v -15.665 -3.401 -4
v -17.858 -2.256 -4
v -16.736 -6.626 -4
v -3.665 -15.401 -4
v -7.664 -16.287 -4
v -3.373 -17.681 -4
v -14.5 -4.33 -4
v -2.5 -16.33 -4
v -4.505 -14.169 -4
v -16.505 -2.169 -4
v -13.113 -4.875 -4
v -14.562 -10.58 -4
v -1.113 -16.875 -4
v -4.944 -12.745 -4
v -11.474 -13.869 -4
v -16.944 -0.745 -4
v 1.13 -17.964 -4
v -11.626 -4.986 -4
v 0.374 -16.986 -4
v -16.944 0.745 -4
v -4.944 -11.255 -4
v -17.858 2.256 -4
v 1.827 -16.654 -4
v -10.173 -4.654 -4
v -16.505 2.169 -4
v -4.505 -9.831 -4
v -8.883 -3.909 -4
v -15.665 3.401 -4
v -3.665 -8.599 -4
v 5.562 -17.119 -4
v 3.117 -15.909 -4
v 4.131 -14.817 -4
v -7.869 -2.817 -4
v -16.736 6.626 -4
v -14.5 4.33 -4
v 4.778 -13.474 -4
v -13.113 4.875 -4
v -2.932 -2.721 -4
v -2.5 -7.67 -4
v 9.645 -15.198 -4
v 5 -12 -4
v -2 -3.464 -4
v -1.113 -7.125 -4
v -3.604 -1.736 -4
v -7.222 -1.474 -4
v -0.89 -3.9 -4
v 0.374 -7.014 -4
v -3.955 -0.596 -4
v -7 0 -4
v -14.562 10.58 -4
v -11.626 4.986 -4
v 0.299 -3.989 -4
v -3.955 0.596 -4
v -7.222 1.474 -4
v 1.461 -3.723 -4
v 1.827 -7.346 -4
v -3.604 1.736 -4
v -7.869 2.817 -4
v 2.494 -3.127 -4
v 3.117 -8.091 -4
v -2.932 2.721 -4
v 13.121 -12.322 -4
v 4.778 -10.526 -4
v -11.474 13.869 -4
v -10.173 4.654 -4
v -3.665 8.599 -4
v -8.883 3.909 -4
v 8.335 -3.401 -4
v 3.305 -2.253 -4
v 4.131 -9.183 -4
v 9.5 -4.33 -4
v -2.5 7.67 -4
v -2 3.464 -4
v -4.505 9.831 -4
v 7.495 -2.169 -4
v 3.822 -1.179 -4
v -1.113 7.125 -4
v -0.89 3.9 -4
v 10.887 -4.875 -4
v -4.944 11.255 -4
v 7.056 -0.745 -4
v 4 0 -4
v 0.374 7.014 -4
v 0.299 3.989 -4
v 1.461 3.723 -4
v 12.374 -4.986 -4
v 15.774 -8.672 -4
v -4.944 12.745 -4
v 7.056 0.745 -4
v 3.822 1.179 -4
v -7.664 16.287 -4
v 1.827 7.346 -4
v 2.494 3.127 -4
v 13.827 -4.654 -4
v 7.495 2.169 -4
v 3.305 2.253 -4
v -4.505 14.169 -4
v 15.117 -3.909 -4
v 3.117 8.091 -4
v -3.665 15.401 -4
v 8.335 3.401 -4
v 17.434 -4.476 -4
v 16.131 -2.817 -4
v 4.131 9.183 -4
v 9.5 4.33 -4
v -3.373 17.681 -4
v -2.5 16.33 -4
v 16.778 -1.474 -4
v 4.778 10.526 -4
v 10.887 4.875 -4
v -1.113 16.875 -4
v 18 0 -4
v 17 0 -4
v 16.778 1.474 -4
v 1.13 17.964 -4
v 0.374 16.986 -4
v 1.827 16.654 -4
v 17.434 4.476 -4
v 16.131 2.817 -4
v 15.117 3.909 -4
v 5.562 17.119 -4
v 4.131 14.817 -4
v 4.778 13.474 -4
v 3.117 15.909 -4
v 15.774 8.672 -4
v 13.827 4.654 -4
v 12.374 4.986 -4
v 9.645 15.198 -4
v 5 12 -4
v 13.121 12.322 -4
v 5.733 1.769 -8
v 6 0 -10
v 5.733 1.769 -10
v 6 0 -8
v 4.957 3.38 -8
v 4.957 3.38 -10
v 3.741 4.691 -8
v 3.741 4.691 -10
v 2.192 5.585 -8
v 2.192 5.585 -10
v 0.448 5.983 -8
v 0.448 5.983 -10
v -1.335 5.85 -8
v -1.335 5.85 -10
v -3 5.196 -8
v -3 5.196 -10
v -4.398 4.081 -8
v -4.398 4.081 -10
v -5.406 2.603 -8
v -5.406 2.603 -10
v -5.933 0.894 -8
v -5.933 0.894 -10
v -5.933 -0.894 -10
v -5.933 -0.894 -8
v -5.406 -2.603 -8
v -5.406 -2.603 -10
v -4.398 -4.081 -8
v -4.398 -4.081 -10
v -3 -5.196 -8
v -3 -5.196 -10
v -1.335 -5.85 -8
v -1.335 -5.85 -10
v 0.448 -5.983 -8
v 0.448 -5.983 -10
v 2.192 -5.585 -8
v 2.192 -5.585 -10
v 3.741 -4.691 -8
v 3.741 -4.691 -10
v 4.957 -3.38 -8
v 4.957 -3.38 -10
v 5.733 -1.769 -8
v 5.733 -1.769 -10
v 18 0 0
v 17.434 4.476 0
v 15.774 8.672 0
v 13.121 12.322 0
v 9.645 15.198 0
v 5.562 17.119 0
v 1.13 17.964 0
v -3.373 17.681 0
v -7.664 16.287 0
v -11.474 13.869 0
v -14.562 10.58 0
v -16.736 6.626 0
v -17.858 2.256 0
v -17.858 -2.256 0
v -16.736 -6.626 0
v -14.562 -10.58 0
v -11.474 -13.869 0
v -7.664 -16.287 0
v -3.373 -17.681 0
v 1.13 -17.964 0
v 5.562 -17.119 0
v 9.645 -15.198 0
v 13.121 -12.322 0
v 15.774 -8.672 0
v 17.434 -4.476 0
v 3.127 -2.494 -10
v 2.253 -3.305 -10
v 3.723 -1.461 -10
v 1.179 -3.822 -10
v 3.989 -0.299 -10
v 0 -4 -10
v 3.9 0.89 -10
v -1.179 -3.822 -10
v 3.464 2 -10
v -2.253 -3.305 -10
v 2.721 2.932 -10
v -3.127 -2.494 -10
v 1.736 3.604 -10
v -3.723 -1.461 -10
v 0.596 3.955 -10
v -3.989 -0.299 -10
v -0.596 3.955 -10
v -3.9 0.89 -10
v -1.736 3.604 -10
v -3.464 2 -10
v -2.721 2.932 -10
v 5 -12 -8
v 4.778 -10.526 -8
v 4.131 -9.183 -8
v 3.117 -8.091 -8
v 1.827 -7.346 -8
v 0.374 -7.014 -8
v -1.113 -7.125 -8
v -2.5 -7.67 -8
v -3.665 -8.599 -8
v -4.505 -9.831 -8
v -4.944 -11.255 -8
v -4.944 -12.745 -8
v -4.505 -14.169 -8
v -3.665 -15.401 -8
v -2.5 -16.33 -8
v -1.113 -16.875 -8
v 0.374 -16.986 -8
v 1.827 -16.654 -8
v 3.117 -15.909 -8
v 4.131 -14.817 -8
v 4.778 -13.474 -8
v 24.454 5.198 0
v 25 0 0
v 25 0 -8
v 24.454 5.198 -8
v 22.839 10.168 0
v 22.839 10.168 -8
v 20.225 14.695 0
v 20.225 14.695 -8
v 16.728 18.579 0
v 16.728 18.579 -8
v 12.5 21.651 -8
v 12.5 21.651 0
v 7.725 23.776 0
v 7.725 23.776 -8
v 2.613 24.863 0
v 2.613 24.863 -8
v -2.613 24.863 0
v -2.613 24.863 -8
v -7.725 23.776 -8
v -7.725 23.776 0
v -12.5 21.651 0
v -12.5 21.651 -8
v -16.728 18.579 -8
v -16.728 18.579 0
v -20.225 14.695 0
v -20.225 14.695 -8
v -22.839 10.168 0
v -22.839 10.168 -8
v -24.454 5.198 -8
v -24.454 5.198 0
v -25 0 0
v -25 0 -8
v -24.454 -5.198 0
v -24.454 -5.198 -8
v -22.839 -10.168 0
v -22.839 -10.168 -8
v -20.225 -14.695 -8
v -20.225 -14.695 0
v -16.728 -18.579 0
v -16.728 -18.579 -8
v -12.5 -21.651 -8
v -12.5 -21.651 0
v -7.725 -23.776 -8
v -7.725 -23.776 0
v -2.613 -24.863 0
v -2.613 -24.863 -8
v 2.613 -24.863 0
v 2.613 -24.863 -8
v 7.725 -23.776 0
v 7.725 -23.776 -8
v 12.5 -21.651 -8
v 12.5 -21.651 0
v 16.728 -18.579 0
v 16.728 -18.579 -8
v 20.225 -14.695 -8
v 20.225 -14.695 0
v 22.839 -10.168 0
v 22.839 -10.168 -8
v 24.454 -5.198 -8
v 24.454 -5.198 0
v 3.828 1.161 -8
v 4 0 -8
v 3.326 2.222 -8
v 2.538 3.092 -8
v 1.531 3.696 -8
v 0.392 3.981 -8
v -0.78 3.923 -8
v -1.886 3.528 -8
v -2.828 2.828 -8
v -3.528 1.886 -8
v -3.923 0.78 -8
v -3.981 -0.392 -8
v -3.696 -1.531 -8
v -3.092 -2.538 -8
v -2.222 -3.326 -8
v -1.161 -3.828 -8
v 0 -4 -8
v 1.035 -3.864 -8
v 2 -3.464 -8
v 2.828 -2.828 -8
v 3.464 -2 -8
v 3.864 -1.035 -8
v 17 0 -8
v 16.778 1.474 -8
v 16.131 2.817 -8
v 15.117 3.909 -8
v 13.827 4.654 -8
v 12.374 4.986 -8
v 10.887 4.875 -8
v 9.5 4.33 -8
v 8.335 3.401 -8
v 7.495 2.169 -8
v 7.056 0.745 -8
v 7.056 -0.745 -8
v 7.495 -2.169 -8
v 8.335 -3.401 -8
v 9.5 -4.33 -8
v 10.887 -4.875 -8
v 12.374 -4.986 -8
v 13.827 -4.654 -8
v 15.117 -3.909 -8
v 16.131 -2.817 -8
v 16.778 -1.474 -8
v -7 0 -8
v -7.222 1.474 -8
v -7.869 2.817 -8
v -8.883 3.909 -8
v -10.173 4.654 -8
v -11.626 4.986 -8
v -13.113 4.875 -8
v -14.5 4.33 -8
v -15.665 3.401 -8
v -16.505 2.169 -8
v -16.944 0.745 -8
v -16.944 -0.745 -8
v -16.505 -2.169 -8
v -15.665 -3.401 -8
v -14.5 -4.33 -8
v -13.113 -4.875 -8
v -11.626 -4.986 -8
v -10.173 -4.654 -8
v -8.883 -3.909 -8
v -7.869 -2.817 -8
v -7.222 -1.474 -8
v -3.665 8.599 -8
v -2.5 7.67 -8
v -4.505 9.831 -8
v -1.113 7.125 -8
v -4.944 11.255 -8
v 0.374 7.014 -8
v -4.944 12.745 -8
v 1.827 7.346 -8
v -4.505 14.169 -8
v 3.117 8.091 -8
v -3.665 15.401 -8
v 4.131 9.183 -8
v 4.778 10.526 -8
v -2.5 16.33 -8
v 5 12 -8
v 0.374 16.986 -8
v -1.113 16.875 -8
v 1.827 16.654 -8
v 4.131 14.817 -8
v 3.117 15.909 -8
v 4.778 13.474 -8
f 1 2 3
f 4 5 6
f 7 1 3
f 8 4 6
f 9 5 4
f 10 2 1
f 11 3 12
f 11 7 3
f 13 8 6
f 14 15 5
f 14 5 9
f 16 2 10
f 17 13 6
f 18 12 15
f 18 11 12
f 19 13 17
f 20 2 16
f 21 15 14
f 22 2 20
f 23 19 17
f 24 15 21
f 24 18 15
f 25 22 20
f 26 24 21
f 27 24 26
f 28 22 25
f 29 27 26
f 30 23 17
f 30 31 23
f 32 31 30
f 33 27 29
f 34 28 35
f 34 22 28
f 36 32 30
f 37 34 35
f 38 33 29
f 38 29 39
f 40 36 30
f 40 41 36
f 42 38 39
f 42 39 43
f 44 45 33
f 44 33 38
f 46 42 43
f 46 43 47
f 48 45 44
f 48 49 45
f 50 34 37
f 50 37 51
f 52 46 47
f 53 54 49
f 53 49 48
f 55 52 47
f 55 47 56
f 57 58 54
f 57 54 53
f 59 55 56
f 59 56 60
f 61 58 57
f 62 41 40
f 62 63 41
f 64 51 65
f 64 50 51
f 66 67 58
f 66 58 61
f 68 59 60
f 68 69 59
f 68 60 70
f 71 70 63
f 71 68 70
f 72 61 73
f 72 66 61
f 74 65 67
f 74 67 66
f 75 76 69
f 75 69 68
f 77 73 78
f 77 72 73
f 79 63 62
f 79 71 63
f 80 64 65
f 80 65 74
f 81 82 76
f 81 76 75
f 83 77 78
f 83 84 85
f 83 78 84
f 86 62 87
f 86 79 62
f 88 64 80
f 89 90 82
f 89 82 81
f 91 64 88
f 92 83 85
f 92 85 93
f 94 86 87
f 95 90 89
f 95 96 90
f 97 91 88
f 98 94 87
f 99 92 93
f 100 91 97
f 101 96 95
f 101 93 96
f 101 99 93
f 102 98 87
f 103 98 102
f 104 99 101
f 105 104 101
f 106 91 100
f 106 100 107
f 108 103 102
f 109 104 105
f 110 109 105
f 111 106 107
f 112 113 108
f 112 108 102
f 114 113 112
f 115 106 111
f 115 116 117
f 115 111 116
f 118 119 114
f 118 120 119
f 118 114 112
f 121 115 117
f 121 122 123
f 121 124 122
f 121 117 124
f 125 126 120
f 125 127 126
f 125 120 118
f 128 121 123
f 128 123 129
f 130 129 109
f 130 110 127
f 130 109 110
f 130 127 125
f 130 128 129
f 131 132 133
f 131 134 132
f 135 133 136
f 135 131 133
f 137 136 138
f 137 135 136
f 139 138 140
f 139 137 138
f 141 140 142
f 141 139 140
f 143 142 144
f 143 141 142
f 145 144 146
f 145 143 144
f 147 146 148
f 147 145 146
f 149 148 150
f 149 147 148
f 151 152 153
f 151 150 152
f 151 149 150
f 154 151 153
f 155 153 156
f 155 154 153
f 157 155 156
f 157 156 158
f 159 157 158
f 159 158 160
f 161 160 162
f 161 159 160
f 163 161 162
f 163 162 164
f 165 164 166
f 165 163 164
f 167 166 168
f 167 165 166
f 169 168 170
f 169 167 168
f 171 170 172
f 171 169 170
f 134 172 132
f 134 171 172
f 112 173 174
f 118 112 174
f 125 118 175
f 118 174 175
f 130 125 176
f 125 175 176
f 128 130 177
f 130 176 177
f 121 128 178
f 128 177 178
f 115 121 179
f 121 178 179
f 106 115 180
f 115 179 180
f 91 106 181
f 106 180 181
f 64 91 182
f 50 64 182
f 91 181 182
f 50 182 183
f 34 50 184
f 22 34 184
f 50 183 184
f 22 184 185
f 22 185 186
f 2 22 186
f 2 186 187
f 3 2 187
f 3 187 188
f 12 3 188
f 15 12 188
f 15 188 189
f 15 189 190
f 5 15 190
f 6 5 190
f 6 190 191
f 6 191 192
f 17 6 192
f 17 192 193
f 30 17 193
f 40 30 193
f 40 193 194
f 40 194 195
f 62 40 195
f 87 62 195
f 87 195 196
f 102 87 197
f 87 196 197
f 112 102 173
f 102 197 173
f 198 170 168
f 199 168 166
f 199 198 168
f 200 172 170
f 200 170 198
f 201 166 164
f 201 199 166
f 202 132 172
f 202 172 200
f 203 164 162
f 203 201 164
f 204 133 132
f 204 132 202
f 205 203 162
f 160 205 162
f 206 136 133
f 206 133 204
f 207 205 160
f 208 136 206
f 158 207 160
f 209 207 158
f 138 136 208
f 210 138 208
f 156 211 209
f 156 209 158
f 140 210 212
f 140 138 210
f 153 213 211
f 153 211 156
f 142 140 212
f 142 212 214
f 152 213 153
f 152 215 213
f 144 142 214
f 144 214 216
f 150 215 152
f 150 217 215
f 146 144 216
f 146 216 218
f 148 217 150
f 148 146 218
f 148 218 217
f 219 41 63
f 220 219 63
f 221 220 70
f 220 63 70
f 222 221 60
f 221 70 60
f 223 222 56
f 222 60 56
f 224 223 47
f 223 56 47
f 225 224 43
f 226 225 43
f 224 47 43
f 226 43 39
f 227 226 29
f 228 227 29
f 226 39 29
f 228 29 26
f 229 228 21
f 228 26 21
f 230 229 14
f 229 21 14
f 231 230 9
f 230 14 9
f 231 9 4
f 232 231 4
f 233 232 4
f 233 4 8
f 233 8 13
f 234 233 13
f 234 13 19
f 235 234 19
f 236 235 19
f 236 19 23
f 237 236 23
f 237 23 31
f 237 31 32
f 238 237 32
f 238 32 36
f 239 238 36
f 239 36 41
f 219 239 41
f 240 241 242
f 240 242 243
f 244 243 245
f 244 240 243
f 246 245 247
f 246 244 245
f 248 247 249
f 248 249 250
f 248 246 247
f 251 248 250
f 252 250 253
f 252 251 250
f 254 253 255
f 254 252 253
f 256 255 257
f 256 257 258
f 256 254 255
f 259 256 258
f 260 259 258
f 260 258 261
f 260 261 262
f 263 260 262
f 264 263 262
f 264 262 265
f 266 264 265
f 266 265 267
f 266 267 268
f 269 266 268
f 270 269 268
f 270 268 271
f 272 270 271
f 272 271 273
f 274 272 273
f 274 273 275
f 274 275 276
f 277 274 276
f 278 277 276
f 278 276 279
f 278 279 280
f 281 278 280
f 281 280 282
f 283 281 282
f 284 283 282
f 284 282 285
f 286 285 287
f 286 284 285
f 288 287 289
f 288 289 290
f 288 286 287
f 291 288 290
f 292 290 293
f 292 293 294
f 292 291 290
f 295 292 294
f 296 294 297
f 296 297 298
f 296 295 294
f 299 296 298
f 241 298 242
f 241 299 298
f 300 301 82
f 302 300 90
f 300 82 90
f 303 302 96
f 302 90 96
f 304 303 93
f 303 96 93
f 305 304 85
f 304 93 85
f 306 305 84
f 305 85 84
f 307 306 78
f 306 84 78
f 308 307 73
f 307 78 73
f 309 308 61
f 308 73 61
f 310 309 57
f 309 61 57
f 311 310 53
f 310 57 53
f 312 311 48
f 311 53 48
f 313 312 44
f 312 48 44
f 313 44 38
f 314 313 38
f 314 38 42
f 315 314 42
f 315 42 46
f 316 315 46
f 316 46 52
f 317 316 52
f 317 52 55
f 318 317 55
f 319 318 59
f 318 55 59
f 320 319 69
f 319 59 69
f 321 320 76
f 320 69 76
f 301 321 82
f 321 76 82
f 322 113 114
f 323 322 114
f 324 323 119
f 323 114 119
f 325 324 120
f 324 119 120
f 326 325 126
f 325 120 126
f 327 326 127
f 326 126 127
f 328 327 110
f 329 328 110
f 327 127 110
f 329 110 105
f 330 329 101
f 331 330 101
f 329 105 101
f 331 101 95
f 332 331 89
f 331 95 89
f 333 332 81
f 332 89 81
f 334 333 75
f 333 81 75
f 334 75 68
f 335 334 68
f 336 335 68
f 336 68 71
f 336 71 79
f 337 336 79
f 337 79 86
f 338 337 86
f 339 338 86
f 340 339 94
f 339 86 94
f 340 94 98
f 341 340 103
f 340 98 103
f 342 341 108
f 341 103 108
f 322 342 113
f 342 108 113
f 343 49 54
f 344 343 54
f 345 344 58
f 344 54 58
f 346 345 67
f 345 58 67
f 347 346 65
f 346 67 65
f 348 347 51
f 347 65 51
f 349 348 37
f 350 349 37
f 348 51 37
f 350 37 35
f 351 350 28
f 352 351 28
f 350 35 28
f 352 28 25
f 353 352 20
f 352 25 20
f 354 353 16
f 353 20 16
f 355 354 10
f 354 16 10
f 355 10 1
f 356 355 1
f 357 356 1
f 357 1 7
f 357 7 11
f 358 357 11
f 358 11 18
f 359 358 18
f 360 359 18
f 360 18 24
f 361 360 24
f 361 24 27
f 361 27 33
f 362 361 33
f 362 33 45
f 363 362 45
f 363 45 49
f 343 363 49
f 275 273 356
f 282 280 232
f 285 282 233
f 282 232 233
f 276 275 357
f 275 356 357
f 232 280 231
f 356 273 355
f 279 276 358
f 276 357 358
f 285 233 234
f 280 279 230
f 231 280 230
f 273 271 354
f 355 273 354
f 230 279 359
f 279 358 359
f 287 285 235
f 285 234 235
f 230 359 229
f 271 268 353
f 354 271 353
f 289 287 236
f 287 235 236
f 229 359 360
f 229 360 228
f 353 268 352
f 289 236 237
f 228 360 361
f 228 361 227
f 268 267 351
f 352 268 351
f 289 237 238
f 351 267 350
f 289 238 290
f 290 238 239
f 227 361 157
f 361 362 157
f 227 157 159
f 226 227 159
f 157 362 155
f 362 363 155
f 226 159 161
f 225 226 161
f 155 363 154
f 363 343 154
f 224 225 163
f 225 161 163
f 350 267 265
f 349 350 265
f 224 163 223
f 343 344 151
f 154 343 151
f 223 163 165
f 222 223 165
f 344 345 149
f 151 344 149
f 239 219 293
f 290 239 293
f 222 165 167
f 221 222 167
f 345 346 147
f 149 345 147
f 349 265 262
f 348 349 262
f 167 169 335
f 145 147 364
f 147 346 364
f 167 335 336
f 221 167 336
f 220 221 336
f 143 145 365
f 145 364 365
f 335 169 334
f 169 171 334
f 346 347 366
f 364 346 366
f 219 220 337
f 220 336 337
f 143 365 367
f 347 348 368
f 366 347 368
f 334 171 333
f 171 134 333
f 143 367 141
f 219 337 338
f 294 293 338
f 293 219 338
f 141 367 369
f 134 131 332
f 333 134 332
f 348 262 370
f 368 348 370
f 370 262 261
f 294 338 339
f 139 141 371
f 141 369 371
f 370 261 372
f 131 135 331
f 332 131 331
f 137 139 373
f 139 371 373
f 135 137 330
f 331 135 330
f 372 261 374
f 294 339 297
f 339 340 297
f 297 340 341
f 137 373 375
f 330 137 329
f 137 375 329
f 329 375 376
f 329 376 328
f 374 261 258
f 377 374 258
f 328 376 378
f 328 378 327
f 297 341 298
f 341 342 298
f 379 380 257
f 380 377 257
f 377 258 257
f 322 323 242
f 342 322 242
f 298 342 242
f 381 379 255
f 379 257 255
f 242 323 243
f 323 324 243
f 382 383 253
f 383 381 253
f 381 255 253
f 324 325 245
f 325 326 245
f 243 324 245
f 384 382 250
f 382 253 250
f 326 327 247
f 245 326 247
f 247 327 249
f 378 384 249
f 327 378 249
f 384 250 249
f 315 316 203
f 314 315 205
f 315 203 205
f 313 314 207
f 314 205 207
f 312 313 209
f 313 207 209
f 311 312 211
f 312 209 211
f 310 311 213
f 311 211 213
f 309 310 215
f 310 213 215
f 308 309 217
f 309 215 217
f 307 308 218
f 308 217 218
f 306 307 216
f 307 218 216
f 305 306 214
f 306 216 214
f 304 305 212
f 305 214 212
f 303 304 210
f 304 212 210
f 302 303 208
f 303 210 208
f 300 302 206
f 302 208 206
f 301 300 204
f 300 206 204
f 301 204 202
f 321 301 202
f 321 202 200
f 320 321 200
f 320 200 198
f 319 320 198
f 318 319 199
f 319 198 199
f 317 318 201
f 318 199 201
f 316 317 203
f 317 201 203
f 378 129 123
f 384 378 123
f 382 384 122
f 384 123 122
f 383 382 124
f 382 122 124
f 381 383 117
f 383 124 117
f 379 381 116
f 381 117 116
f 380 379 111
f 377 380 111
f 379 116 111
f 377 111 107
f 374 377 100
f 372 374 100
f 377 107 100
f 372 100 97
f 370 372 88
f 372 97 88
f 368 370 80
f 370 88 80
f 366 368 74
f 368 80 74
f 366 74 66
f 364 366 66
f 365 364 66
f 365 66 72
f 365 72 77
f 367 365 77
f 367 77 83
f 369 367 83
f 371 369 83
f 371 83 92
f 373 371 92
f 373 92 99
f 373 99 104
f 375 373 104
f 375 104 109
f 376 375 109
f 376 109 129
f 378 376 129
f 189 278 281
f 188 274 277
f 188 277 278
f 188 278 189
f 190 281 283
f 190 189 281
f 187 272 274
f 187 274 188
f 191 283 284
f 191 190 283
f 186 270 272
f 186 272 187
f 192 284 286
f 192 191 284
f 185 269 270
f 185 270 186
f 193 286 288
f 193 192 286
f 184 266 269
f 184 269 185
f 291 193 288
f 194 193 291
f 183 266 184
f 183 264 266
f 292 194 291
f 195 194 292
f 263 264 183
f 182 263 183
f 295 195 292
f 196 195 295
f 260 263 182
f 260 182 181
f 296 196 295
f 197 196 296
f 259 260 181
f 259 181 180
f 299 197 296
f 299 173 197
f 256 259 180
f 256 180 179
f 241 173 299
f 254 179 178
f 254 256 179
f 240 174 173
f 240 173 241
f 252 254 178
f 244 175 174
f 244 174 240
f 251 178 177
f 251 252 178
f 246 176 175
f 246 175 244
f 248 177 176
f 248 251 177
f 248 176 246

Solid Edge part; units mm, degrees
sketch "Sketch1" plane through (0, 0, 0) normal (0, 0, 1) x (1, 0, 0)
  circle A0 centre (0, 0) radius 25
extrude "Protrusion1" add sketch "Sketch1" against normal blind 8
sketch "Sketch2" plane through (0, 0, 0) normal (0, 0, 1) x (1, 0, 0)
  circle A0 centre (0, 0) radius 18
extrude "BigHole" cut sketch "Sketch2" against normal blind 4
sketch "Sketch3" plane through (0, 0, -4) normal (0, 0, 1) x (1, 0, 0)
  circle A0 centre (0, 0) radius 4
extrude "SmallMiddleHoleP1" cut sketch "Sketch3" against normal blind 6
sketch "Sketch4" plane through (0, 0, -8) normal (0, 0, -1) x (1, 0, 0)
  circle A0 centre (0, 0) radius 6
extrude "SmallExtensionBottom" add sketch "Sketch4" along normal blind 2
sketch "Sketch5" plane through (0, 0, -10) normal (0, 0, -1) x (0, -1, 0)
  circle A0 centre (0, 0) radius 4
extrude "SmallMiddleHoleP2" cut sketch "Sketch5" against normal blind 2
sketch "Sketch6" plane through (0, 0, -4) normal (0, 0, 1) x (1, 0, 0)
  circle A0 centre (12, 0) radius 5
  circle A1 centre (-12, 0) radius 5
  circle A2 centre (0, 12) radius 5
  circle A3 centre (0, -12) radius 5
extrude "v_2HolesLR" cut sketch "Sketch6" against normal blind 6
